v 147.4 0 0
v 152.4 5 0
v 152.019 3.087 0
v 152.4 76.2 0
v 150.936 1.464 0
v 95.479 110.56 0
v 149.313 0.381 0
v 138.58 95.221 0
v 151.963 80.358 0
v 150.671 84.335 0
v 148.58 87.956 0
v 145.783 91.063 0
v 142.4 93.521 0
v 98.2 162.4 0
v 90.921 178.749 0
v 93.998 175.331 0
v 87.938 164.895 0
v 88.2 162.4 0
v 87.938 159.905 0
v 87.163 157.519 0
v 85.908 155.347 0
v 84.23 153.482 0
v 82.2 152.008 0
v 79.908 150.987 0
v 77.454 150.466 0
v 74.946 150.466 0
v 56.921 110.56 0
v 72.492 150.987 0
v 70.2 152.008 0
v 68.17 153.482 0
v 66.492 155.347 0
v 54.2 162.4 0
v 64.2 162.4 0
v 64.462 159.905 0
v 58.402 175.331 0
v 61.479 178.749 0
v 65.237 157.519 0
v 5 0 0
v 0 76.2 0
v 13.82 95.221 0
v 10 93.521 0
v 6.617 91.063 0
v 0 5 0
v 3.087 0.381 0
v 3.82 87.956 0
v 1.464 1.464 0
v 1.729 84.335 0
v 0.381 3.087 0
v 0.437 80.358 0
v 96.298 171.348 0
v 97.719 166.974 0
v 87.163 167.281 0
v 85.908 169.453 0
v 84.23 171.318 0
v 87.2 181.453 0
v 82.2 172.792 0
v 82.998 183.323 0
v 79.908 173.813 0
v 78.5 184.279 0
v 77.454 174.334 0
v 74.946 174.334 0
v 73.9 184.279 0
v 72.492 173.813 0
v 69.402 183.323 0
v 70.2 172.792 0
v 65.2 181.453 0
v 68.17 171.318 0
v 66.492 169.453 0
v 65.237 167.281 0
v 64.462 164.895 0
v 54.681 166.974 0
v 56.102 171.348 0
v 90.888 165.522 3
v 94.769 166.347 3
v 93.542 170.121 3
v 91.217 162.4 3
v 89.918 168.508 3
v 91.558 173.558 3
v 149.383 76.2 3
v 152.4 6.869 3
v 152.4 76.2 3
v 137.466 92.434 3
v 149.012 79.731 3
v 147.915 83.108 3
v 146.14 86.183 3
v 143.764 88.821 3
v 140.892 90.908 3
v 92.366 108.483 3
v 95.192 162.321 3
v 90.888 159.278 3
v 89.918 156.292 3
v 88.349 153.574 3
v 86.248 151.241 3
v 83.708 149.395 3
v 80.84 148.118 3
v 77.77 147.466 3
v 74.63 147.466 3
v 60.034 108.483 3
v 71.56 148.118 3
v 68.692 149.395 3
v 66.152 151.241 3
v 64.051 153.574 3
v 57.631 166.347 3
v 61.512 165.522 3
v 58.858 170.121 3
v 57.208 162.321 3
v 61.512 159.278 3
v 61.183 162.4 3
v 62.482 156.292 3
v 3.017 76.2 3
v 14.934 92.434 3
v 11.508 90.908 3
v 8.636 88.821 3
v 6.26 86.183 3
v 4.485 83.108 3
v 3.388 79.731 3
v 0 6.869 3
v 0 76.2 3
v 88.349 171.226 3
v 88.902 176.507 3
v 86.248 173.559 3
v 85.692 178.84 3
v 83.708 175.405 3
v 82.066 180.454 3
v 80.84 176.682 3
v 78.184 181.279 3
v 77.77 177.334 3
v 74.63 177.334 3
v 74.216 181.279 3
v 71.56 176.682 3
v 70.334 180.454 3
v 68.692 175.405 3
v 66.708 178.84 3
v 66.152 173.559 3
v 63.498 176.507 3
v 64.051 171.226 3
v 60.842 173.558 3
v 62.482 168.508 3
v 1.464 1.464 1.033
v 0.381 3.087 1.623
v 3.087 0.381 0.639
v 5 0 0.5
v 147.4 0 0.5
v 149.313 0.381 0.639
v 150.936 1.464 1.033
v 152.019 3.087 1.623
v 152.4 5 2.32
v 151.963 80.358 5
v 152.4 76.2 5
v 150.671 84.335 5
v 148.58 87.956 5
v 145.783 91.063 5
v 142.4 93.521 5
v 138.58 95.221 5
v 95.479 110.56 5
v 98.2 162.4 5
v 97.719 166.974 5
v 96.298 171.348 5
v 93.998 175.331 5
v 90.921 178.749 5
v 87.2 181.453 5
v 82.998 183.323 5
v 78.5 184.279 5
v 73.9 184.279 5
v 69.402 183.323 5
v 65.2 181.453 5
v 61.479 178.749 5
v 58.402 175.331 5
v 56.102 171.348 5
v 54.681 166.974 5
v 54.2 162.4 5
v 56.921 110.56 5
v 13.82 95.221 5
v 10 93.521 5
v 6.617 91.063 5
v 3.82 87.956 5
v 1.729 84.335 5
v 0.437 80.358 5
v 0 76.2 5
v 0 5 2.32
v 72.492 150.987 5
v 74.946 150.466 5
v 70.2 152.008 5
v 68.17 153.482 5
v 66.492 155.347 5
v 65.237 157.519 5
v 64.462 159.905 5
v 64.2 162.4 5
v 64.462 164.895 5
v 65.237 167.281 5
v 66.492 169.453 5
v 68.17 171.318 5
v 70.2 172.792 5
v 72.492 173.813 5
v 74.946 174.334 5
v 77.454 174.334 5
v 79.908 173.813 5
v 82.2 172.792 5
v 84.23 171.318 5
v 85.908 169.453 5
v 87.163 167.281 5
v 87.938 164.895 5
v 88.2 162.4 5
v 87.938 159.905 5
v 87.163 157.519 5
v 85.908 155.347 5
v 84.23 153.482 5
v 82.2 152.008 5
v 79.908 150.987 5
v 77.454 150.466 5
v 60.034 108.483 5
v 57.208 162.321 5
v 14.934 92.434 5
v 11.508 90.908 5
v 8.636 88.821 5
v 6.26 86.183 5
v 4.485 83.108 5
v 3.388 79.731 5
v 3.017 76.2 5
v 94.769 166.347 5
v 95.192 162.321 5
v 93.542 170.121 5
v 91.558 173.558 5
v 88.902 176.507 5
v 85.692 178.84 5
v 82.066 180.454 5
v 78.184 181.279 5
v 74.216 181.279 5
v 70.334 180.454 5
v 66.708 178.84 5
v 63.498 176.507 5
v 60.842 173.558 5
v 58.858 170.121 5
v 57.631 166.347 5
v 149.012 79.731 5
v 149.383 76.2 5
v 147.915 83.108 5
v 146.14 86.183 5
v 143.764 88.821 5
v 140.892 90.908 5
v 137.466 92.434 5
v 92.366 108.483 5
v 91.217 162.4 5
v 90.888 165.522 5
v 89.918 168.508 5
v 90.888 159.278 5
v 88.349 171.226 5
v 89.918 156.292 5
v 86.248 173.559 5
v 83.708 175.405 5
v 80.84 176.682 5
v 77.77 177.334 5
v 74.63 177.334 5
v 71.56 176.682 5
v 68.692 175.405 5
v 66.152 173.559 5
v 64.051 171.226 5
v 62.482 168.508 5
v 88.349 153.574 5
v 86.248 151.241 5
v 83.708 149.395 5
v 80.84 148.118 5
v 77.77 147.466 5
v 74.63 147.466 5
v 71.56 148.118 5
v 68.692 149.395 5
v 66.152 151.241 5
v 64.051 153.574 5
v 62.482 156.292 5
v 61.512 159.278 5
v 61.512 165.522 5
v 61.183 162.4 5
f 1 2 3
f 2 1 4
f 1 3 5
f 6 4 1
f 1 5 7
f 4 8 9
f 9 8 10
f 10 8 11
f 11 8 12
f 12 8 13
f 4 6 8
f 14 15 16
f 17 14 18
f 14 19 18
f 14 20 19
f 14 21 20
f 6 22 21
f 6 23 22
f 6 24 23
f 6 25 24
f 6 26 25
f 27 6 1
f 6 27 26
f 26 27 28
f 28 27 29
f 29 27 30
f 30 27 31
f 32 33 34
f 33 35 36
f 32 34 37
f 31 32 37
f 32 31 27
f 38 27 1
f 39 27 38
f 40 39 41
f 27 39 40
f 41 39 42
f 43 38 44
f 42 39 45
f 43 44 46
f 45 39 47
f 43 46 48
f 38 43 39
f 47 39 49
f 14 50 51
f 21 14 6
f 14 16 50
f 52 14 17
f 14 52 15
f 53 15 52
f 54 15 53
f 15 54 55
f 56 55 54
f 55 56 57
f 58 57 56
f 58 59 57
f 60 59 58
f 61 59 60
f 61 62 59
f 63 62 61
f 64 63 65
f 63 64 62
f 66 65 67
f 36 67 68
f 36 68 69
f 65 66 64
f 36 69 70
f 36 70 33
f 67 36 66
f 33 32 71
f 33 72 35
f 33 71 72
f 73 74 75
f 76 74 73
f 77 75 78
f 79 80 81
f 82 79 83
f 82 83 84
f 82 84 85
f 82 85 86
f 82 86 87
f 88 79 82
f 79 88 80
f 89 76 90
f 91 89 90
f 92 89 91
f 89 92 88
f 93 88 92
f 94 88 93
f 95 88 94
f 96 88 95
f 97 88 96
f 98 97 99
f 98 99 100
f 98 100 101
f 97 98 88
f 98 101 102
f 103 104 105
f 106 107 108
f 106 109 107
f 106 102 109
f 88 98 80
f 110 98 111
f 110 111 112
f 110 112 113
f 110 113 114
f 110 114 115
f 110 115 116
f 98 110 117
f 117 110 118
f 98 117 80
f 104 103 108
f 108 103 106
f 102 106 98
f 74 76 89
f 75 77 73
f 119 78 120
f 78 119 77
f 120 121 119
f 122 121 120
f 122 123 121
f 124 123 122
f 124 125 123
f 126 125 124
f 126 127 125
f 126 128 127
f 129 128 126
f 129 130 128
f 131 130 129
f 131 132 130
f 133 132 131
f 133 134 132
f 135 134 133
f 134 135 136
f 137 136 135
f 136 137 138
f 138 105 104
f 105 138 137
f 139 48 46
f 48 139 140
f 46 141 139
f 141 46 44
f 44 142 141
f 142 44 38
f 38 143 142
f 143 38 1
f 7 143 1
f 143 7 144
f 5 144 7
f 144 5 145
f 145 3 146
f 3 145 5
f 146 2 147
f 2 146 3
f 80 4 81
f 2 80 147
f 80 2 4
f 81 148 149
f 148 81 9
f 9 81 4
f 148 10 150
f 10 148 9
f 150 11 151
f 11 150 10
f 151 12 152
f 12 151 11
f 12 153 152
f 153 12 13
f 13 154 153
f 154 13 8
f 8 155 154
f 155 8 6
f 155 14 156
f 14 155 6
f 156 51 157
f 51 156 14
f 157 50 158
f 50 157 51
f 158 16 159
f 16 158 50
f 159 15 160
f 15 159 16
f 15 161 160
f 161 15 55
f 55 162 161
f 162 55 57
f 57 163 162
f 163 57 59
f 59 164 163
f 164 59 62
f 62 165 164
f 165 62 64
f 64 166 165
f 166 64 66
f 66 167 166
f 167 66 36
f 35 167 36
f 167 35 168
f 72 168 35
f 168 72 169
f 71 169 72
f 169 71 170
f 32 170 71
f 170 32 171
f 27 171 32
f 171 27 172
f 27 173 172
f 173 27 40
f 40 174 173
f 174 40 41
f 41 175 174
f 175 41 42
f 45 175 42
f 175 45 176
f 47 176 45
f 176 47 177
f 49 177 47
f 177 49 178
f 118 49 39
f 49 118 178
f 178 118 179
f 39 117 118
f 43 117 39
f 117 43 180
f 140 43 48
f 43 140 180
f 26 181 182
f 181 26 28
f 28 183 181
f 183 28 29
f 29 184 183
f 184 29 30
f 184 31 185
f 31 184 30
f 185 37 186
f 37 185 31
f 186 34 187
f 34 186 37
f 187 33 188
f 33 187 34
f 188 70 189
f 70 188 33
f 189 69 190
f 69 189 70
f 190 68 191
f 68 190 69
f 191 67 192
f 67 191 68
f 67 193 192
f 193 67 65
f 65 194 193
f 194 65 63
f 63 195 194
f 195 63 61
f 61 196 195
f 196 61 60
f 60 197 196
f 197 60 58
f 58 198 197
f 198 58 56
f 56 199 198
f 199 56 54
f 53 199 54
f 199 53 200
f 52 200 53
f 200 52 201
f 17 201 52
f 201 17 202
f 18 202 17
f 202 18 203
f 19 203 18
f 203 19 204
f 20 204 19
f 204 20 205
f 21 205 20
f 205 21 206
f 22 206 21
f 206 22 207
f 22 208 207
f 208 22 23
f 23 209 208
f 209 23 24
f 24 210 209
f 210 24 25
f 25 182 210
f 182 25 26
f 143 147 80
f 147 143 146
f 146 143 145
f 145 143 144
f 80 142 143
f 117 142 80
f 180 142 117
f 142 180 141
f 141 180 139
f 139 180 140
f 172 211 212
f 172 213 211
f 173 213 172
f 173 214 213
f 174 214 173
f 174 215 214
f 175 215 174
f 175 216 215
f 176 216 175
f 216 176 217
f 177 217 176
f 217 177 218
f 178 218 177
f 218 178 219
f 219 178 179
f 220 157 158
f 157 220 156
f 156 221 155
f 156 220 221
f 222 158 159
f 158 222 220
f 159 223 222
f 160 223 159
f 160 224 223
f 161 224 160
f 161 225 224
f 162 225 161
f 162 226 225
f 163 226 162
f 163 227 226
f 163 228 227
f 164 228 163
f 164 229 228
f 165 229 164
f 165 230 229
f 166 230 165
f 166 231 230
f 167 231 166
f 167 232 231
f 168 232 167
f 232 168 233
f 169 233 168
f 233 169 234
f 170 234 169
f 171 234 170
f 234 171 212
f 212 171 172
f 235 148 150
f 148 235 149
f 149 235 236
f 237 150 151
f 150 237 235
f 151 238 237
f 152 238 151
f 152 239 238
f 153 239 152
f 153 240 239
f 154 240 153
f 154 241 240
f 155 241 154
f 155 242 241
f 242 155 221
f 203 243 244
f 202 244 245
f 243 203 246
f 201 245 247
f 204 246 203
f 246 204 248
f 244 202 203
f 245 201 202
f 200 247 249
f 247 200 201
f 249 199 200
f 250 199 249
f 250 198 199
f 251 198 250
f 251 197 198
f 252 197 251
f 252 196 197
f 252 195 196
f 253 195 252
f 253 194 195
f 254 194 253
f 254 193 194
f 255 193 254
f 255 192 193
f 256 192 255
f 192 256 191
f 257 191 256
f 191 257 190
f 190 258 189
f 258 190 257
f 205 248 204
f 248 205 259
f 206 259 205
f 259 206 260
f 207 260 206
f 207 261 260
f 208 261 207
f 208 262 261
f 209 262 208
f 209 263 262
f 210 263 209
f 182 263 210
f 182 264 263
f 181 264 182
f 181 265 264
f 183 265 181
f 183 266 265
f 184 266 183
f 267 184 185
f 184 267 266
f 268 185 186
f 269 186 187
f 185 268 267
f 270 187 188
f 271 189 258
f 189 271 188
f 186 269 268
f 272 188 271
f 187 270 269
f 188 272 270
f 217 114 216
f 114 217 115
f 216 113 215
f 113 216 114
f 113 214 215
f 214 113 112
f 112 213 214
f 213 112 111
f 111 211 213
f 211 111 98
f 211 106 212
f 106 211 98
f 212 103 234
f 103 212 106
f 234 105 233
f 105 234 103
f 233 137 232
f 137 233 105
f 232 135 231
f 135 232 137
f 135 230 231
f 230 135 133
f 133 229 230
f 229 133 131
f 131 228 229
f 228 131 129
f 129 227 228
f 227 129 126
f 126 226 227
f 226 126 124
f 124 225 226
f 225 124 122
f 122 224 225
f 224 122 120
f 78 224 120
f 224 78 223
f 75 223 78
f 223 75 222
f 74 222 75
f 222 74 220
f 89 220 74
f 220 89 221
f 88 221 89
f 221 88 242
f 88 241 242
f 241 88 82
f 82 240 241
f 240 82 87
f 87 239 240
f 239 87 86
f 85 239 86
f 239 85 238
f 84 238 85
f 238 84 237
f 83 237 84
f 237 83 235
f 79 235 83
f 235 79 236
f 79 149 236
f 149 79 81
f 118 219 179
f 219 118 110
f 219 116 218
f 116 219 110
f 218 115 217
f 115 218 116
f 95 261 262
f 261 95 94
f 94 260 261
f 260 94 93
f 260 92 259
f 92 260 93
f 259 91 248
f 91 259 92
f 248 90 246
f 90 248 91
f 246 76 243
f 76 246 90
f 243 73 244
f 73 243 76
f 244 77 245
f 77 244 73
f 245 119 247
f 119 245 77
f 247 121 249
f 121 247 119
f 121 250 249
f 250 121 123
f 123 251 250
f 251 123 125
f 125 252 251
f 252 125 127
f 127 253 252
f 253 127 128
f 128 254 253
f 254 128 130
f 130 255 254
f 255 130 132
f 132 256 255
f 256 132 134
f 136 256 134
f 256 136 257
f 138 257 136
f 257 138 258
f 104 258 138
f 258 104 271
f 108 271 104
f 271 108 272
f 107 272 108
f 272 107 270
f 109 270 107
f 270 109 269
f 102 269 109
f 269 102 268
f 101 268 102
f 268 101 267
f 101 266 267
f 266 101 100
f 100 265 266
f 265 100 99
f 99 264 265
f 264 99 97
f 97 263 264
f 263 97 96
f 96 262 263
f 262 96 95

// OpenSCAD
sw=25.4*6;
st=25.4*3;
difference() {
  linear_extrude(3) {
    scraper();
    handle();
  }
  translate([-.01,0,.5]) rotate([20,0]) cube([sw+.02,20,20]);
}
linear_extrude(5) {
 difference() {
   union() {
   offset(0) handle();
   }
   offset(delta=-3) handle();
   square([sw,st]);
 } 
}
module scraper() {
  translate([0,5]) square([sw,st-5]);
  hull() {
    for(x=[5,sw-5],y=[5])
      translate([x,y]) circle(r=5);
  }
}
module handle() {
  hull() {
    translate([20,st])
      circle(r=20);
    translate([sw-20,st])
      circle(r=20);
    translate([sw/2,st+20])
      circle(r=20);
  }
  translate([sw/2,st+10])
    difference() {
      hull() {
        circle(r=18);
        translate([0,25.4*3]) circle(r=22);
      }
      translate([0,25.4*3]) circle(r=12);
    }
}
